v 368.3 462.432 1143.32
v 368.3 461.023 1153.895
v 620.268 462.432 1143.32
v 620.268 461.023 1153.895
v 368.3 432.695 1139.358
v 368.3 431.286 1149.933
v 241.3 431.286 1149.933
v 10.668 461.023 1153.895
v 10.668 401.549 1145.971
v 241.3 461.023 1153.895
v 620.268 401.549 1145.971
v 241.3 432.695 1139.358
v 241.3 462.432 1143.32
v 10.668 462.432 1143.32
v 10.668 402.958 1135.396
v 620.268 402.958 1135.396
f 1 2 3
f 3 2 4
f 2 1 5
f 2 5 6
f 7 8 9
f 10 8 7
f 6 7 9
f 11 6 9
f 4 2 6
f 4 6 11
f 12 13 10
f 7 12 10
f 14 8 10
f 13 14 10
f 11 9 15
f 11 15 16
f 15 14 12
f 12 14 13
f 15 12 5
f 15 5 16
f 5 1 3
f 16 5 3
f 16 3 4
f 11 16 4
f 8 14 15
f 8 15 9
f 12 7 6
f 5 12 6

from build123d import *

# Parameters (mm, degrees)
BOX019_W               = 127
BOX019_H               = 10.668
BOX019_DEPTH           = 30
BOX019_PLACEMENT_ANGLE = 97.5889000001
BOX018_W               = 609.6
BOX018_H               = 10.668
BOX018_DEPTH           = 60
BOX018_PLACEMENT_ANGLE = 97.5889000001


with BuildPart() as screensupporthole:
    # Box019 → Box019 (new body)
    with BuildSketch(Plane.XY):
        with Locations((63.5, 5.334)):
            Rectangle(BOX019_W, BOX019_H)
    extrude(amount=BOX019_DEPTH)


with BuildPart() as screensupporthole_1:
    # Box019 placement: moved
    add(screensupporthole.part.moved(Location((241.3, 462.432, 1143.32))).rotate(Axis((241.3, 462.432, 1143.32), (1, 0, 0)), BOX019_PLACEMENT_ANGLE))


with BuildPart() as screenbottom:
    # Box018 → Box018 (new body)
    with BuildSketch(Plane.XY):
        with Locations((304.8, 5.334)):
            Rectangle(BOX018_W, BOX018_H)
    extrude(amount=BOX018_DEPTH)


with BuildPart() as screenbottom_1:
    # Box018 placement: moved
    add(screenbottom.part.moved(Location((10.668, 462.432, 1143.32))).rotate(Axis((10.668, 462.432, 1143.32), (1, 0, 0)), BOX018_PLACEMENT_ANGLE))

    # Cut003: cut ScreenSupportHole
    add(screensupporthole_1.part, mode=Mode.SUBTRACT)


solid = screenbottom_1.part
